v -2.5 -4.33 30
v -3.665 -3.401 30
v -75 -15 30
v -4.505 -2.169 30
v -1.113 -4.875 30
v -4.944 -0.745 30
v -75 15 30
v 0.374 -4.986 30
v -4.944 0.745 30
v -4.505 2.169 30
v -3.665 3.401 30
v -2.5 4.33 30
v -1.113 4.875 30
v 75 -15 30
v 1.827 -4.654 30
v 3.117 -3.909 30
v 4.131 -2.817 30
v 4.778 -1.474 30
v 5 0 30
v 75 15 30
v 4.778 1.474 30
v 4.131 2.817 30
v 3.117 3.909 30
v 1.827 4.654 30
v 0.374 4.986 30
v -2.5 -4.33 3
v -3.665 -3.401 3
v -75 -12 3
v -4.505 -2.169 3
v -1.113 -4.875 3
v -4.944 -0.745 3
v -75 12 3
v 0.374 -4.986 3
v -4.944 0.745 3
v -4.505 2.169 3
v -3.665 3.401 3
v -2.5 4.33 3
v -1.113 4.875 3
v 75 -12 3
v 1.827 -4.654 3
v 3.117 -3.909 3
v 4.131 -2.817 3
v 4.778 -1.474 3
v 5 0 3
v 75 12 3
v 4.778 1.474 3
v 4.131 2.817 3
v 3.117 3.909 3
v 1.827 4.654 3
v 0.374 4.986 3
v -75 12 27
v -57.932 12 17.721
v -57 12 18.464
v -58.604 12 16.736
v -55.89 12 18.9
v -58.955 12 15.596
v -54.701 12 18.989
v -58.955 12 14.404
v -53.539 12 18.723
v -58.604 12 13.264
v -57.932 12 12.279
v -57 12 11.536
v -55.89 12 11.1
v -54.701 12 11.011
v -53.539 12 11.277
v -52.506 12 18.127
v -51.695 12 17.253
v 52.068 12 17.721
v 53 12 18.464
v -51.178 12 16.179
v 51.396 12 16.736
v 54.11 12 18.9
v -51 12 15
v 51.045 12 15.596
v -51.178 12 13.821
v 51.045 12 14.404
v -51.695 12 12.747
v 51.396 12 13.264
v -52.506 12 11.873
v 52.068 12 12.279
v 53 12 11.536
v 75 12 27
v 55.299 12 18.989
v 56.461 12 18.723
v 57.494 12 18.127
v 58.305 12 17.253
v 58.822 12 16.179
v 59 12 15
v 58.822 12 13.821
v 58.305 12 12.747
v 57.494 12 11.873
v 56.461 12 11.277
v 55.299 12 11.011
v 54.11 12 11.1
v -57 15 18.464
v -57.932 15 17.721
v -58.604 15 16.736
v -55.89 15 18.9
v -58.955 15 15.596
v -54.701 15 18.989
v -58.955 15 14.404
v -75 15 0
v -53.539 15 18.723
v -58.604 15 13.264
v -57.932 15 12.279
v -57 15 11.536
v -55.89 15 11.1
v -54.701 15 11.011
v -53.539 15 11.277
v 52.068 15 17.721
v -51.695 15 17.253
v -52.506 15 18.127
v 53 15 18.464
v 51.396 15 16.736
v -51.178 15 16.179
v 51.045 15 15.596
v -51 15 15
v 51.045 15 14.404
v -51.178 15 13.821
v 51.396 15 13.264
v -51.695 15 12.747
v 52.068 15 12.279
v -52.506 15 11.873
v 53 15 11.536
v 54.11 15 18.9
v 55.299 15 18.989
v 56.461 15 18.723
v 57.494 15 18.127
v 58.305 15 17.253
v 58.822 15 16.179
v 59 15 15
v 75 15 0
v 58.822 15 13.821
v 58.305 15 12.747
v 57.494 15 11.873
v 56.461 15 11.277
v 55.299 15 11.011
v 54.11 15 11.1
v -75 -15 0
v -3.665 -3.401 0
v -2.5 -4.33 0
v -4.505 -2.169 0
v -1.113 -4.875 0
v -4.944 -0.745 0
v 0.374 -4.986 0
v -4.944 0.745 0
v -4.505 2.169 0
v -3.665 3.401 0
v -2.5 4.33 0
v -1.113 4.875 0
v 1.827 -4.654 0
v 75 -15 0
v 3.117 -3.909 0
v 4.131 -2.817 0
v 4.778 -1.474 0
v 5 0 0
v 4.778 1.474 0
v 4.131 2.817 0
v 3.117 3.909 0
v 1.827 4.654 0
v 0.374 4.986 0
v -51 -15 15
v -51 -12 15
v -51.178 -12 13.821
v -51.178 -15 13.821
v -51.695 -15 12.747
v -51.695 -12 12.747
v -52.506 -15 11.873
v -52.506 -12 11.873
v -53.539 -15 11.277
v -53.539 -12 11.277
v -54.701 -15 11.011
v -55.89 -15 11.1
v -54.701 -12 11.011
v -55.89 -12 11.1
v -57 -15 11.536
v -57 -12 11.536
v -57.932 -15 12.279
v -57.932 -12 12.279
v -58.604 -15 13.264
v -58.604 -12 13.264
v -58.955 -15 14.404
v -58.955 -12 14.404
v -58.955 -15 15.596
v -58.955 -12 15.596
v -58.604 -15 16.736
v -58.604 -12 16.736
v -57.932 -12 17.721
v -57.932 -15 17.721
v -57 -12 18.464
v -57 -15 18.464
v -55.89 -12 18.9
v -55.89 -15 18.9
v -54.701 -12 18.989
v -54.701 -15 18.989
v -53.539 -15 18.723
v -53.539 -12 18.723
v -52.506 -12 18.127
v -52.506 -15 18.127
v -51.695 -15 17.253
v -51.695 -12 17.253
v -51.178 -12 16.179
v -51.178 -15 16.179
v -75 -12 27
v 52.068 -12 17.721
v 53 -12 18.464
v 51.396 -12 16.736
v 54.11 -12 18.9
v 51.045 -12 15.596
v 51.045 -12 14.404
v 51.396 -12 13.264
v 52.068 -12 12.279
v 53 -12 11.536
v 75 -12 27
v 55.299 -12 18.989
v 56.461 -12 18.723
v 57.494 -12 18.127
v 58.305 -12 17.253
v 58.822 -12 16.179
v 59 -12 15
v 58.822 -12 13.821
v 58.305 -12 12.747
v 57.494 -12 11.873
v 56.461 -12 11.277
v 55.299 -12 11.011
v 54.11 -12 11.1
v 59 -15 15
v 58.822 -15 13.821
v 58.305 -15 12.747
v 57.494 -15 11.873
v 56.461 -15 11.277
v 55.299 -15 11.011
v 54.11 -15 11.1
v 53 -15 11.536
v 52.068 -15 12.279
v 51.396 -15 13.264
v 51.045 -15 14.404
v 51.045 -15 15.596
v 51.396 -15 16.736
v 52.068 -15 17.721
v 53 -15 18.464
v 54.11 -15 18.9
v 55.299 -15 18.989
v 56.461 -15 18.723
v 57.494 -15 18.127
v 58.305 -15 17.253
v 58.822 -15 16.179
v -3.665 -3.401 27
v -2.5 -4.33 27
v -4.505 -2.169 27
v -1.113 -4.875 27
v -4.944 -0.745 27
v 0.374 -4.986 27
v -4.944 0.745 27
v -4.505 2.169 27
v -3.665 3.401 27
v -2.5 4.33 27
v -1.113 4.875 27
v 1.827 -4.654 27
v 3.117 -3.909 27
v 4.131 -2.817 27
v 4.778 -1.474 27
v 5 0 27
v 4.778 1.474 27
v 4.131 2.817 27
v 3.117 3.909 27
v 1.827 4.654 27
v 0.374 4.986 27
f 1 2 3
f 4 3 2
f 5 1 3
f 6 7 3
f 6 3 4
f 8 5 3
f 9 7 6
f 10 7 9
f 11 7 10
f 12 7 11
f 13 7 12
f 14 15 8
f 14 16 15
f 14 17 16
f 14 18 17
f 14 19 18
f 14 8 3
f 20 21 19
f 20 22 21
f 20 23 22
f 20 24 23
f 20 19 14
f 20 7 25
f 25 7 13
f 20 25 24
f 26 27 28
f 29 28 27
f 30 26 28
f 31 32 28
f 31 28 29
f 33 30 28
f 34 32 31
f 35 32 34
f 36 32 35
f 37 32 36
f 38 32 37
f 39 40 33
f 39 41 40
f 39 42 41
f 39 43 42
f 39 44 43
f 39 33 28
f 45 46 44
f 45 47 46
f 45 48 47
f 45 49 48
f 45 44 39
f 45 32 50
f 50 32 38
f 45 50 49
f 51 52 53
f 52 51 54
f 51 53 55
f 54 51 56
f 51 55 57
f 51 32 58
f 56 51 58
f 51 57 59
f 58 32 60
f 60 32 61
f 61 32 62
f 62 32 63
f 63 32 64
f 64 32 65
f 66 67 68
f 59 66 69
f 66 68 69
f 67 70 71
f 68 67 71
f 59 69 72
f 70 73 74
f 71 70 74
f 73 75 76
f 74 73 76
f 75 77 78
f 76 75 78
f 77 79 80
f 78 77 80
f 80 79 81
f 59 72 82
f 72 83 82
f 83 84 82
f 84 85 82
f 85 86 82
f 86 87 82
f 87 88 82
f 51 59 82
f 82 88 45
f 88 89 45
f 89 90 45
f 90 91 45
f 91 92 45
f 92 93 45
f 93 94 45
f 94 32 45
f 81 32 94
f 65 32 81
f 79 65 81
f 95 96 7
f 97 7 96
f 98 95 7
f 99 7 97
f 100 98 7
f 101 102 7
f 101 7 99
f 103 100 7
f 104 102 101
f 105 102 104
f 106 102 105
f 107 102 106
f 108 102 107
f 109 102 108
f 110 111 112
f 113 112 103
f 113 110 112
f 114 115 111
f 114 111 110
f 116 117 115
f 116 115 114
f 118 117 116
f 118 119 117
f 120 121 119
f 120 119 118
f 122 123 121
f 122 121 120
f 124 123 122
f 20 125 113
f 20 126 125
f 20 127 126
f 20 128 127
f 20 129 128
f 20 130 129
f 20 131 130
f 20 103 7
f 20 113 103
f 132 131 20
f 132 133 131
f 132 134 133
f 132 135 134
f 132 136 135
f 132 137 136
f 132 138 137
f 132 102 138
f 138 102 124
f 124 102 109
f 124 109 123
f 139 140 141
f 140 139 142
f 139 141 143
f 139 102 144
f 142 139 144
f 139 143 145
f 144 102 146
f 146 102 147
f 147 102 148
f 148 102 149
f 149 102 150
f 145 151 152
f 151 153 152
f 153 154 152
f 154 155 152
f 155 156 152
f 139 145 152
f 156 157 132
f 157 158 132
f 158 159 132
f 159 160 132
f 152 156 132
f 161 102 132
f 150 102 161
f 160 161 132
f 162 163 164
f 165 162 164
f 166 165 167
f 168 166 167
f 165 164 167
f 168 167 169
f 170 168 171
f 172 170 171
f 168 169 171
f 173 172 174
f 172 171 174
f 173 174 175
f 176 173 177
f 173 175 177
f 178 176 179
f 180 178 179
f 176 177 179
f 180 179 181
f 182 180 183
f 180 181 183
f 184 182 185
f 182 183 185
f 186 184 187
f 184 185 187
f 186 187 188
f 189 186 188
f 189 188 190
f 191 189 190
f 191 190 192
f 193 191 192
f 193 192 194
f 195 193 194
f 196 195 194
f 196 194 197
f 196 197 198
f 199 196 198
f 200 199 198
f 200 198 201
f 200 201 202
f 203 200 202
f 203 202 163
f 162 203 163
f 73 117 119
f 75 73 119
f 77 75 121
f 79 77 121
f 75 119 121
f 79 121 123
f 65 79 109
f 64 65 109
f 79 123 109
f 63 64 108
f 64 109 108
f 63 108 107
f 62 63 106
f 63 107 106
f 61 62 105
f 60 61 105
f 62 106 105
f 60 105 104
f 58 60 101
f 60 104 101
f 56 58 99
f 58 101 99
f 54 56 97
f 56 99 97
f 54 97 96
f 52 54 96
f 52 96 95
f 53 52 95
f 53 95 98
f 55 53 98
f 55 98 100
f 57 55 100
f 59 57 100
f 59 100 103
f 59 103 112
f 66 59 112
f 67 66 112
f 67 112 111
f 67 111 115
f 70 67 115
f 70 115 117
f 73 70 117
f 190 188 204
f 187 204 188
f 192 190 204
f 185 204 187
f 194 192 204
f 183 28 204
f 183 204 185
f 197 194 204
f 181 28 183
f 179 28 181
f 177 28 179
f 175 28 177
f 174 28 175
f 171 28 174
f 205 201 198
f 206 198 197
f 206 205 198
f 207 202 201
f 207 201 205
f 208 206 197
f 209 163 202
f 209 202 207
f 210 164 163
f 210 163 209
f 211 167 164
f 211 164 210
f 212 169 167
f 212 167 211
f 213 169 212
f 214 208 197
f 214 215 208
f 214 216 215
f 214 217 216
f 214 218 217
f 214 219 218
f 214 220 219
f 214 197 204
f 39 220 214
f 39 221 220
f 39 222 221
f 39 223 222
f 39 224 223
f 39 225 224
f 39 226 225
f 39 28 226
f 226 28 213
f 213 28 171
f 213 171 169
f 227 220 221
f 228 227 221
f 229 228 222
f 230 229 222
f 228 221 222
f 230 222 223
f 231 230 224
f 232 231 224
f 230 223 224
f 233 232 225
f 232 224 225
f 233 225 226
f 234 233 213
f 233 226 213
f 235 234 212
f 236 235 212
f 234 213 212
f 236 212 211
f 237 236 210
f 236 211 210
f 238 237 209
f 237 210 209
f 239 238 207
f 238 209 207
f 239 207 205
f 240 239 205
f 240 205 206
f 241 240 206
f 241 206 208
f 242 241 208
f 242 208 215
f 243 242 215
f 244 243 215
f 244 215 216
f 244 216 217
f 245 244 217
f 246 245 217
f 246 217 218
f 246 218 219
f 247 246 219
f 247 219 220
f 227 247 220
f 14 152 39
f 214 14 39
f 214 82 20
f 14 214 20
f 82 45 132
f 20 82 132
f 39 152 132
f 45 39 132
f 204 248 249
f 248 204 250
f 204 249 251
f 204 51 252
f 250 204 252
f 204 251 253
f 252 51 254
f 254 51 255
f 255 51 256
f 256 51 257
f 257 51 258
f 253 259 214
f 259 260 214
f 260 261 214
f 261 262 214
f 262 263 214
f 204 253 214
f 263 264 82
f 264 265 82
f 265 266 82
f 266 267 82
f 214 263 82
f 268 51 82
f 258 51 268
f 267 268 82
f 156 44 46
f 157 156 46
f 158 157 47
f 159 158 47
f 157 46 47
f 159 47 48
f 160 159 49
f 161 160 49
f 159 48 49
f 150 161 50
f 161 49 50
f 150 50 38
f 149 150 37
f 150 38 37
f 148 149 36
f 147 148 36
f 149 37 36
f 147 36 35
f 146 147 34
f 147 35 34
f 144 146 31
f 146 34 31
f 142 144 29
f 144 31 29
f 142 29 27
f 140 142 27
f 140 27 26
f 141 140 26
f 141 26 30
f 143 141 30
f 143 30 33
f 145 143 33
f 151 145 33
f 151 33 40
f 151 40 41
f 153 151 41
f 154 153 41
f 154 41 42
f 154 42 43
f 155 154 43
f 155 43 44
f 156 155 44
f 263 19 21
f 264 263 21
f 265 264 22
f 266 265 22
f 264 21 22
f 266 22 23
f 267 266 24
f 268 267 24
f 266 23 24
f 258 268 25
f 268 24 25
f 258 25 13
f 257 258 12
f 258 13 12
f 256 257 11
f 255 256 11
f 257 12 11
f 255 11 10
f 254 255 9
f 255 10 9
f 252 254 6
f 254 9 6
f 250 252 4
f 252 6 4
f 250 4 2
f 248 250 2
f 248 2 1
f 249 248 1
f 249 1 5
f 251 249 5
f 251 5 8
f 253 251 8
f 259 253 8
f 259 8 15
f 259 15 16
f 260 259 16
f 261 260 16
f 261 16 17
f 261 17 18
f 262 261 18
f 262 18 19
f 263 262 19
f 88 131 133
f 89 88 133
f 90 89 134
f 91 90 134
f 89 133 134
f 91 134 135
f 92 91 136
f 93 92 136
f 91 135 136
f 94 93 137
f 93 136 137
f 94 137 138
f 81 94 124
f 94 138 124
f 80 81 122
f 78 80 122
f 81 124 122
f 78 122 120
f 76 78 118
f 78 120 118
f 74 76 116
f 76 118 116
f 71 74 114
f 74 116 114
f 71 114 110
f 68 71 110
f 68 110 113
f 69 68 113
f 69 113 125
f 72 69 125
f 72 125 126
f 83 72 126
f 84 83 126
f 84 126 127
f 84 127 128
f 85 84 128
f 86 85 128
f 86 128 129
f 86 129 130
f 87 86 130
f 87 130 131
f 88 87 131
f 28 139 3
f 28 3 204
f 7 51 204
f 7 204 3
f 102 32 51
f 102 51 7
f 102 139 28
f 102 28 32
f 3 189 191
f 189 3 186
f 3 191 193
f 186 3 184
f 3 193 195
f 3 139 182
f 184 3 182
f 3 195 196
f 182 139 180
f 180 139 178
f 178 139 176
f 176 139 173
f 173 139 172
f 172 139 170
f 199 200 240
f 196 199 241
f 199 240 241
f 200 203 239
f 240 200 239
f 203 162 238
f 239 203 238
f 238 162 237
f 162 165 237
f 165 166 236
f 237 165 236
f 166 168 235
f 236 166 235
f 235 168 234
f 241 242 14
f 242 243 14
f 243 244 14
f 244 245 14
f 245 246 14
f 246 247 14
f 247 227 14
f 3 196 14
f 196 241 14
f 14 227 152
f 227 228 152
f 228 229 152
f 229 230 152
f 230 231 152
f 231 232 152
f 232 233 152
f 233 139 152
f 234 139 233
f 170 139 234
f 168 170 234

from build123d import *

# Parameters (mm, degrees)
SKETCH1_W           = 150
SKETCH1_H           = 30
BOSS_EXTRUDE1_DEPTH = 30
SHELL1_T            = -3
SKETCH2_R           = 5
CUT_EXTRUDE1_DEPTH  = 30
SKETCH3_R           = 4
CUT_EXTRUDE2_DEPTH  = 36


with BuildPart() as part:
    # Sketch1 → Boss-Extrude1 (new body)
    with BuildSketch(Plane.XY):
        Rectangle(SKETCH1_W, SKETCH1_H)
    extrude(amount=BOSS_EXTRUDE1_DEPTH)

    # Shell1
    shell1_openings = [part.faces().sort_by_distance(p)[0] for p in [
        (-75, 0, 15),
        (75, 0, 15),
    ]]
    offset(amount=SHELL1_T, openings=shell1_openings, kind=Kind.INTERSECTION)

    # Sketch2 → Cut-Extrude1 (cut)
    with BuildSketch(Plane.XY.offset(30)):
        Circle(SKETCH2_R)
    extrude(amount=-CUT_EXTRUDE1_DEPTH, mode=Mode.SUBTRACT)

    # Sketch3 → Cut-Extrude2 (cut)
    with BuildSketch(Plane(origin=(0, 15, 0), x_dir=(1, 0, 0), z_dir=(0, 1, 0))):
        with Locations((-55, -15)):
            Circle(SKETCH3_R)
        with Locations((55, -15)):
            Circle(SKETCH3_R)
    extrude(amount=-CUT_EXTRUDE2_DEPTH, mode=Mode.SUBTRACT)


solid = part.part
